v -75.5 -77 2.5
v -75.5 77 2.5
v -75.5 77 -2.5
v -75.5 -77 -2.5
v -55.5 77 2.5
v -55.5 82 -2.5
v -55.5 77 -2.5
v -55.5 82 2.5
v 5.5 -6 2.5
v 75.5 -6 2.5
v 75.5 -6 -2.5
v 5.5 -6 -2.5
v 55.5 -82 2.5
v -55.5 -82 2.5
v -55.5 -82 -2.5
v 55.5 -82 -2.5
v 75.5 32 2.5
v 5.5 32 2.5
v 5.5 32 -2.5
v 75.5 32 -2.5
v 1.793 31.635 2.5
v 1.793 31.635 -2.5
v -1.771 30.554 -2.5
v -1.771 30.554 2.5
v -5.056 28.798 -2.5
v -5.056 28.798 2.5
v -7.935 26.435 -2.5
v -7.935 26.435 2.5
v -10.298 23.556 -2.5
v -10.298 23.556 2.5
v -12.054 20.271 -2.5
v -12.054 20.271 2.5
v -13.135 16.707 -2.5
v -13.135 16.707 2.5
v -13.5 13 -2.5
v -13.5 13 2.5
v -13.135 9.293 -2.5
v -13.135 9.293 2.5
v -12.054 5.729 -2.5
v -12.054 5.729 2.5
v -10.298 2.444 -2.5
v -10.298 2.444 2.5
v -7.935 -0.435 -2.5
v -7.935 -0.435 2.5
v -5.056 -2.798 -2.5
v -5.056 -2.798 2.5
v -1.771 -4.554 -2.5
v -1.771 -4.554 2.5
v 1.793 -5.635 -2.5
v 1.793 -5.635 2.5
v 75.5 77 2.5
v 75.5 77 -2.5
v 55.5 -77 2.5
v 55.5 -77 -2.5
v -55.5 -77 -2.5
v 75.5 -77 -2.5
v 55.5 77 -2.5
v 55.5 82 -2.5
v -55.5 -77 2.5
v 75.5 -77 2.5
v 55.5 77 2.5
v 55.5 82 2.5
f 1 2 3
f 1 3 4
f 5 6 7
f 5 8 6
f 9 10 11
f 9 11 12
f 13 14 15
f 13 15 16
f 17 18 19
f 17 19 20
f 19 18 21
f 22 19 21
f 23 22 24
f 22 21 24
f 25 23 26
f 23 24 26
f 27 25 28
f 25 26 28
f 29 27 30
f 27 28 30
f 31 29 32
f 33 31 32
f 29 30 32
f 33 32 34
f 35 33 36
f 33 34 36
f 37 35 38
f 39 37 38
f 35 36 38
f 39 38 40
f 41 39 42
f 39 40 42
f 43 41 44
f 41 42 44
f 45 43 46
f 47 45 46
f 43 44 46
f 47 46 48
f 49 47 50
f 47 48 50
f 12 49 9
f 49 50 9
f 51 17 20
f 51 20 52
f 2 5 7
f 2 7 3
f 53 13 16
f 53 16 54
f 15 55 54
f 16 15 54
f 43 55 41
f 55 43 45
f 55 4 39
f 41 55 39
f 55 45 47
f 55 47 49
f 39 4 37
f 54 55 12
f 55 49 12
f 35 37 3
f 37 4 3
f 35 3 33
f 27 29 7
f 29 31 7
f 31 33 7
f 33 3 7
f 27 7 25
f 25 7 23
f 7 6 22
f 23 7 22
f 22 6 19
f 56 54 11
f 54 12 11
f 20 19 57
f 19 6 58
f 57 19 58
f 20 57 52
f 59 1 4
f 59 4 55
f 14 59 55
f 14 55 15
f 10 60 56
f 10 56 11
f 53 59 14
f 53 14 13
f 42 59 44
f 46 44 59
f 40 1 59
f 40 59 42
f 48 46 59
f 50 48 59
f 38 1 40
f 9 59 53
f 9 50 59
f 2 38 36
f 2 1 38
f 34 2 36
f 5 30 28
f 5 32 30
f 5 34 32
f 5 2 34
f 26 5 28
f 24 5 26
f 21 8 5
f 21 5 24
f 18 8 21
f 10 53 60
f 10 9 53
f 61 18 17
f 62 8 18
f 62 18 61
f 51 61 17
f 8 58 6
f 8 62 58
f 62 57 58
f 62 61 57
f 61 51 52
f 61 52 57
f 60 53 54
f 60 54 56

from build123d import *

# Parameters (mm, degrees)
PAD_DEPTH = 2.5


with BuildPart() as part:
    # Sketch → Pad (new body, symmetric)
    with BuildSketch(Plane.XY):
        with BuildLine():
            Line((-55.5, 82), (-55.5, 77))
            Line((-55.5, 77), (-75.5, 77))
            Line((-75.5, 77), (-75.5, -77))
            Line((-75.5, -77), (-55.5, -77))
            Line((-55.5, -77), (-55.5, -82))
            Line((-55.5, -82), (55.5, -82))
            Line((55.5, -82), (55.5, -77))
            Line((55.5, -77), (75.5, -77))
            Line((75.5, -77), (75.5, -6))
            Line((75.5, -6), (5.5, -6))
            ThreePointArc((5.5, 32), (-13.5, 13), (5.5, -6))
            Line((5.5, 32), (75.5, 32))
            Line((75.5, 32), (75.5, 77))
            Line((75.5, 77), (55.5, 77))
            Line((55.5, 77), (55.5, 82))
            Line((55.5, 82), (-55.5, 82))
        make_face()
    extrude(amount=PAD_DEPTH, both=True)


solid = part.part
